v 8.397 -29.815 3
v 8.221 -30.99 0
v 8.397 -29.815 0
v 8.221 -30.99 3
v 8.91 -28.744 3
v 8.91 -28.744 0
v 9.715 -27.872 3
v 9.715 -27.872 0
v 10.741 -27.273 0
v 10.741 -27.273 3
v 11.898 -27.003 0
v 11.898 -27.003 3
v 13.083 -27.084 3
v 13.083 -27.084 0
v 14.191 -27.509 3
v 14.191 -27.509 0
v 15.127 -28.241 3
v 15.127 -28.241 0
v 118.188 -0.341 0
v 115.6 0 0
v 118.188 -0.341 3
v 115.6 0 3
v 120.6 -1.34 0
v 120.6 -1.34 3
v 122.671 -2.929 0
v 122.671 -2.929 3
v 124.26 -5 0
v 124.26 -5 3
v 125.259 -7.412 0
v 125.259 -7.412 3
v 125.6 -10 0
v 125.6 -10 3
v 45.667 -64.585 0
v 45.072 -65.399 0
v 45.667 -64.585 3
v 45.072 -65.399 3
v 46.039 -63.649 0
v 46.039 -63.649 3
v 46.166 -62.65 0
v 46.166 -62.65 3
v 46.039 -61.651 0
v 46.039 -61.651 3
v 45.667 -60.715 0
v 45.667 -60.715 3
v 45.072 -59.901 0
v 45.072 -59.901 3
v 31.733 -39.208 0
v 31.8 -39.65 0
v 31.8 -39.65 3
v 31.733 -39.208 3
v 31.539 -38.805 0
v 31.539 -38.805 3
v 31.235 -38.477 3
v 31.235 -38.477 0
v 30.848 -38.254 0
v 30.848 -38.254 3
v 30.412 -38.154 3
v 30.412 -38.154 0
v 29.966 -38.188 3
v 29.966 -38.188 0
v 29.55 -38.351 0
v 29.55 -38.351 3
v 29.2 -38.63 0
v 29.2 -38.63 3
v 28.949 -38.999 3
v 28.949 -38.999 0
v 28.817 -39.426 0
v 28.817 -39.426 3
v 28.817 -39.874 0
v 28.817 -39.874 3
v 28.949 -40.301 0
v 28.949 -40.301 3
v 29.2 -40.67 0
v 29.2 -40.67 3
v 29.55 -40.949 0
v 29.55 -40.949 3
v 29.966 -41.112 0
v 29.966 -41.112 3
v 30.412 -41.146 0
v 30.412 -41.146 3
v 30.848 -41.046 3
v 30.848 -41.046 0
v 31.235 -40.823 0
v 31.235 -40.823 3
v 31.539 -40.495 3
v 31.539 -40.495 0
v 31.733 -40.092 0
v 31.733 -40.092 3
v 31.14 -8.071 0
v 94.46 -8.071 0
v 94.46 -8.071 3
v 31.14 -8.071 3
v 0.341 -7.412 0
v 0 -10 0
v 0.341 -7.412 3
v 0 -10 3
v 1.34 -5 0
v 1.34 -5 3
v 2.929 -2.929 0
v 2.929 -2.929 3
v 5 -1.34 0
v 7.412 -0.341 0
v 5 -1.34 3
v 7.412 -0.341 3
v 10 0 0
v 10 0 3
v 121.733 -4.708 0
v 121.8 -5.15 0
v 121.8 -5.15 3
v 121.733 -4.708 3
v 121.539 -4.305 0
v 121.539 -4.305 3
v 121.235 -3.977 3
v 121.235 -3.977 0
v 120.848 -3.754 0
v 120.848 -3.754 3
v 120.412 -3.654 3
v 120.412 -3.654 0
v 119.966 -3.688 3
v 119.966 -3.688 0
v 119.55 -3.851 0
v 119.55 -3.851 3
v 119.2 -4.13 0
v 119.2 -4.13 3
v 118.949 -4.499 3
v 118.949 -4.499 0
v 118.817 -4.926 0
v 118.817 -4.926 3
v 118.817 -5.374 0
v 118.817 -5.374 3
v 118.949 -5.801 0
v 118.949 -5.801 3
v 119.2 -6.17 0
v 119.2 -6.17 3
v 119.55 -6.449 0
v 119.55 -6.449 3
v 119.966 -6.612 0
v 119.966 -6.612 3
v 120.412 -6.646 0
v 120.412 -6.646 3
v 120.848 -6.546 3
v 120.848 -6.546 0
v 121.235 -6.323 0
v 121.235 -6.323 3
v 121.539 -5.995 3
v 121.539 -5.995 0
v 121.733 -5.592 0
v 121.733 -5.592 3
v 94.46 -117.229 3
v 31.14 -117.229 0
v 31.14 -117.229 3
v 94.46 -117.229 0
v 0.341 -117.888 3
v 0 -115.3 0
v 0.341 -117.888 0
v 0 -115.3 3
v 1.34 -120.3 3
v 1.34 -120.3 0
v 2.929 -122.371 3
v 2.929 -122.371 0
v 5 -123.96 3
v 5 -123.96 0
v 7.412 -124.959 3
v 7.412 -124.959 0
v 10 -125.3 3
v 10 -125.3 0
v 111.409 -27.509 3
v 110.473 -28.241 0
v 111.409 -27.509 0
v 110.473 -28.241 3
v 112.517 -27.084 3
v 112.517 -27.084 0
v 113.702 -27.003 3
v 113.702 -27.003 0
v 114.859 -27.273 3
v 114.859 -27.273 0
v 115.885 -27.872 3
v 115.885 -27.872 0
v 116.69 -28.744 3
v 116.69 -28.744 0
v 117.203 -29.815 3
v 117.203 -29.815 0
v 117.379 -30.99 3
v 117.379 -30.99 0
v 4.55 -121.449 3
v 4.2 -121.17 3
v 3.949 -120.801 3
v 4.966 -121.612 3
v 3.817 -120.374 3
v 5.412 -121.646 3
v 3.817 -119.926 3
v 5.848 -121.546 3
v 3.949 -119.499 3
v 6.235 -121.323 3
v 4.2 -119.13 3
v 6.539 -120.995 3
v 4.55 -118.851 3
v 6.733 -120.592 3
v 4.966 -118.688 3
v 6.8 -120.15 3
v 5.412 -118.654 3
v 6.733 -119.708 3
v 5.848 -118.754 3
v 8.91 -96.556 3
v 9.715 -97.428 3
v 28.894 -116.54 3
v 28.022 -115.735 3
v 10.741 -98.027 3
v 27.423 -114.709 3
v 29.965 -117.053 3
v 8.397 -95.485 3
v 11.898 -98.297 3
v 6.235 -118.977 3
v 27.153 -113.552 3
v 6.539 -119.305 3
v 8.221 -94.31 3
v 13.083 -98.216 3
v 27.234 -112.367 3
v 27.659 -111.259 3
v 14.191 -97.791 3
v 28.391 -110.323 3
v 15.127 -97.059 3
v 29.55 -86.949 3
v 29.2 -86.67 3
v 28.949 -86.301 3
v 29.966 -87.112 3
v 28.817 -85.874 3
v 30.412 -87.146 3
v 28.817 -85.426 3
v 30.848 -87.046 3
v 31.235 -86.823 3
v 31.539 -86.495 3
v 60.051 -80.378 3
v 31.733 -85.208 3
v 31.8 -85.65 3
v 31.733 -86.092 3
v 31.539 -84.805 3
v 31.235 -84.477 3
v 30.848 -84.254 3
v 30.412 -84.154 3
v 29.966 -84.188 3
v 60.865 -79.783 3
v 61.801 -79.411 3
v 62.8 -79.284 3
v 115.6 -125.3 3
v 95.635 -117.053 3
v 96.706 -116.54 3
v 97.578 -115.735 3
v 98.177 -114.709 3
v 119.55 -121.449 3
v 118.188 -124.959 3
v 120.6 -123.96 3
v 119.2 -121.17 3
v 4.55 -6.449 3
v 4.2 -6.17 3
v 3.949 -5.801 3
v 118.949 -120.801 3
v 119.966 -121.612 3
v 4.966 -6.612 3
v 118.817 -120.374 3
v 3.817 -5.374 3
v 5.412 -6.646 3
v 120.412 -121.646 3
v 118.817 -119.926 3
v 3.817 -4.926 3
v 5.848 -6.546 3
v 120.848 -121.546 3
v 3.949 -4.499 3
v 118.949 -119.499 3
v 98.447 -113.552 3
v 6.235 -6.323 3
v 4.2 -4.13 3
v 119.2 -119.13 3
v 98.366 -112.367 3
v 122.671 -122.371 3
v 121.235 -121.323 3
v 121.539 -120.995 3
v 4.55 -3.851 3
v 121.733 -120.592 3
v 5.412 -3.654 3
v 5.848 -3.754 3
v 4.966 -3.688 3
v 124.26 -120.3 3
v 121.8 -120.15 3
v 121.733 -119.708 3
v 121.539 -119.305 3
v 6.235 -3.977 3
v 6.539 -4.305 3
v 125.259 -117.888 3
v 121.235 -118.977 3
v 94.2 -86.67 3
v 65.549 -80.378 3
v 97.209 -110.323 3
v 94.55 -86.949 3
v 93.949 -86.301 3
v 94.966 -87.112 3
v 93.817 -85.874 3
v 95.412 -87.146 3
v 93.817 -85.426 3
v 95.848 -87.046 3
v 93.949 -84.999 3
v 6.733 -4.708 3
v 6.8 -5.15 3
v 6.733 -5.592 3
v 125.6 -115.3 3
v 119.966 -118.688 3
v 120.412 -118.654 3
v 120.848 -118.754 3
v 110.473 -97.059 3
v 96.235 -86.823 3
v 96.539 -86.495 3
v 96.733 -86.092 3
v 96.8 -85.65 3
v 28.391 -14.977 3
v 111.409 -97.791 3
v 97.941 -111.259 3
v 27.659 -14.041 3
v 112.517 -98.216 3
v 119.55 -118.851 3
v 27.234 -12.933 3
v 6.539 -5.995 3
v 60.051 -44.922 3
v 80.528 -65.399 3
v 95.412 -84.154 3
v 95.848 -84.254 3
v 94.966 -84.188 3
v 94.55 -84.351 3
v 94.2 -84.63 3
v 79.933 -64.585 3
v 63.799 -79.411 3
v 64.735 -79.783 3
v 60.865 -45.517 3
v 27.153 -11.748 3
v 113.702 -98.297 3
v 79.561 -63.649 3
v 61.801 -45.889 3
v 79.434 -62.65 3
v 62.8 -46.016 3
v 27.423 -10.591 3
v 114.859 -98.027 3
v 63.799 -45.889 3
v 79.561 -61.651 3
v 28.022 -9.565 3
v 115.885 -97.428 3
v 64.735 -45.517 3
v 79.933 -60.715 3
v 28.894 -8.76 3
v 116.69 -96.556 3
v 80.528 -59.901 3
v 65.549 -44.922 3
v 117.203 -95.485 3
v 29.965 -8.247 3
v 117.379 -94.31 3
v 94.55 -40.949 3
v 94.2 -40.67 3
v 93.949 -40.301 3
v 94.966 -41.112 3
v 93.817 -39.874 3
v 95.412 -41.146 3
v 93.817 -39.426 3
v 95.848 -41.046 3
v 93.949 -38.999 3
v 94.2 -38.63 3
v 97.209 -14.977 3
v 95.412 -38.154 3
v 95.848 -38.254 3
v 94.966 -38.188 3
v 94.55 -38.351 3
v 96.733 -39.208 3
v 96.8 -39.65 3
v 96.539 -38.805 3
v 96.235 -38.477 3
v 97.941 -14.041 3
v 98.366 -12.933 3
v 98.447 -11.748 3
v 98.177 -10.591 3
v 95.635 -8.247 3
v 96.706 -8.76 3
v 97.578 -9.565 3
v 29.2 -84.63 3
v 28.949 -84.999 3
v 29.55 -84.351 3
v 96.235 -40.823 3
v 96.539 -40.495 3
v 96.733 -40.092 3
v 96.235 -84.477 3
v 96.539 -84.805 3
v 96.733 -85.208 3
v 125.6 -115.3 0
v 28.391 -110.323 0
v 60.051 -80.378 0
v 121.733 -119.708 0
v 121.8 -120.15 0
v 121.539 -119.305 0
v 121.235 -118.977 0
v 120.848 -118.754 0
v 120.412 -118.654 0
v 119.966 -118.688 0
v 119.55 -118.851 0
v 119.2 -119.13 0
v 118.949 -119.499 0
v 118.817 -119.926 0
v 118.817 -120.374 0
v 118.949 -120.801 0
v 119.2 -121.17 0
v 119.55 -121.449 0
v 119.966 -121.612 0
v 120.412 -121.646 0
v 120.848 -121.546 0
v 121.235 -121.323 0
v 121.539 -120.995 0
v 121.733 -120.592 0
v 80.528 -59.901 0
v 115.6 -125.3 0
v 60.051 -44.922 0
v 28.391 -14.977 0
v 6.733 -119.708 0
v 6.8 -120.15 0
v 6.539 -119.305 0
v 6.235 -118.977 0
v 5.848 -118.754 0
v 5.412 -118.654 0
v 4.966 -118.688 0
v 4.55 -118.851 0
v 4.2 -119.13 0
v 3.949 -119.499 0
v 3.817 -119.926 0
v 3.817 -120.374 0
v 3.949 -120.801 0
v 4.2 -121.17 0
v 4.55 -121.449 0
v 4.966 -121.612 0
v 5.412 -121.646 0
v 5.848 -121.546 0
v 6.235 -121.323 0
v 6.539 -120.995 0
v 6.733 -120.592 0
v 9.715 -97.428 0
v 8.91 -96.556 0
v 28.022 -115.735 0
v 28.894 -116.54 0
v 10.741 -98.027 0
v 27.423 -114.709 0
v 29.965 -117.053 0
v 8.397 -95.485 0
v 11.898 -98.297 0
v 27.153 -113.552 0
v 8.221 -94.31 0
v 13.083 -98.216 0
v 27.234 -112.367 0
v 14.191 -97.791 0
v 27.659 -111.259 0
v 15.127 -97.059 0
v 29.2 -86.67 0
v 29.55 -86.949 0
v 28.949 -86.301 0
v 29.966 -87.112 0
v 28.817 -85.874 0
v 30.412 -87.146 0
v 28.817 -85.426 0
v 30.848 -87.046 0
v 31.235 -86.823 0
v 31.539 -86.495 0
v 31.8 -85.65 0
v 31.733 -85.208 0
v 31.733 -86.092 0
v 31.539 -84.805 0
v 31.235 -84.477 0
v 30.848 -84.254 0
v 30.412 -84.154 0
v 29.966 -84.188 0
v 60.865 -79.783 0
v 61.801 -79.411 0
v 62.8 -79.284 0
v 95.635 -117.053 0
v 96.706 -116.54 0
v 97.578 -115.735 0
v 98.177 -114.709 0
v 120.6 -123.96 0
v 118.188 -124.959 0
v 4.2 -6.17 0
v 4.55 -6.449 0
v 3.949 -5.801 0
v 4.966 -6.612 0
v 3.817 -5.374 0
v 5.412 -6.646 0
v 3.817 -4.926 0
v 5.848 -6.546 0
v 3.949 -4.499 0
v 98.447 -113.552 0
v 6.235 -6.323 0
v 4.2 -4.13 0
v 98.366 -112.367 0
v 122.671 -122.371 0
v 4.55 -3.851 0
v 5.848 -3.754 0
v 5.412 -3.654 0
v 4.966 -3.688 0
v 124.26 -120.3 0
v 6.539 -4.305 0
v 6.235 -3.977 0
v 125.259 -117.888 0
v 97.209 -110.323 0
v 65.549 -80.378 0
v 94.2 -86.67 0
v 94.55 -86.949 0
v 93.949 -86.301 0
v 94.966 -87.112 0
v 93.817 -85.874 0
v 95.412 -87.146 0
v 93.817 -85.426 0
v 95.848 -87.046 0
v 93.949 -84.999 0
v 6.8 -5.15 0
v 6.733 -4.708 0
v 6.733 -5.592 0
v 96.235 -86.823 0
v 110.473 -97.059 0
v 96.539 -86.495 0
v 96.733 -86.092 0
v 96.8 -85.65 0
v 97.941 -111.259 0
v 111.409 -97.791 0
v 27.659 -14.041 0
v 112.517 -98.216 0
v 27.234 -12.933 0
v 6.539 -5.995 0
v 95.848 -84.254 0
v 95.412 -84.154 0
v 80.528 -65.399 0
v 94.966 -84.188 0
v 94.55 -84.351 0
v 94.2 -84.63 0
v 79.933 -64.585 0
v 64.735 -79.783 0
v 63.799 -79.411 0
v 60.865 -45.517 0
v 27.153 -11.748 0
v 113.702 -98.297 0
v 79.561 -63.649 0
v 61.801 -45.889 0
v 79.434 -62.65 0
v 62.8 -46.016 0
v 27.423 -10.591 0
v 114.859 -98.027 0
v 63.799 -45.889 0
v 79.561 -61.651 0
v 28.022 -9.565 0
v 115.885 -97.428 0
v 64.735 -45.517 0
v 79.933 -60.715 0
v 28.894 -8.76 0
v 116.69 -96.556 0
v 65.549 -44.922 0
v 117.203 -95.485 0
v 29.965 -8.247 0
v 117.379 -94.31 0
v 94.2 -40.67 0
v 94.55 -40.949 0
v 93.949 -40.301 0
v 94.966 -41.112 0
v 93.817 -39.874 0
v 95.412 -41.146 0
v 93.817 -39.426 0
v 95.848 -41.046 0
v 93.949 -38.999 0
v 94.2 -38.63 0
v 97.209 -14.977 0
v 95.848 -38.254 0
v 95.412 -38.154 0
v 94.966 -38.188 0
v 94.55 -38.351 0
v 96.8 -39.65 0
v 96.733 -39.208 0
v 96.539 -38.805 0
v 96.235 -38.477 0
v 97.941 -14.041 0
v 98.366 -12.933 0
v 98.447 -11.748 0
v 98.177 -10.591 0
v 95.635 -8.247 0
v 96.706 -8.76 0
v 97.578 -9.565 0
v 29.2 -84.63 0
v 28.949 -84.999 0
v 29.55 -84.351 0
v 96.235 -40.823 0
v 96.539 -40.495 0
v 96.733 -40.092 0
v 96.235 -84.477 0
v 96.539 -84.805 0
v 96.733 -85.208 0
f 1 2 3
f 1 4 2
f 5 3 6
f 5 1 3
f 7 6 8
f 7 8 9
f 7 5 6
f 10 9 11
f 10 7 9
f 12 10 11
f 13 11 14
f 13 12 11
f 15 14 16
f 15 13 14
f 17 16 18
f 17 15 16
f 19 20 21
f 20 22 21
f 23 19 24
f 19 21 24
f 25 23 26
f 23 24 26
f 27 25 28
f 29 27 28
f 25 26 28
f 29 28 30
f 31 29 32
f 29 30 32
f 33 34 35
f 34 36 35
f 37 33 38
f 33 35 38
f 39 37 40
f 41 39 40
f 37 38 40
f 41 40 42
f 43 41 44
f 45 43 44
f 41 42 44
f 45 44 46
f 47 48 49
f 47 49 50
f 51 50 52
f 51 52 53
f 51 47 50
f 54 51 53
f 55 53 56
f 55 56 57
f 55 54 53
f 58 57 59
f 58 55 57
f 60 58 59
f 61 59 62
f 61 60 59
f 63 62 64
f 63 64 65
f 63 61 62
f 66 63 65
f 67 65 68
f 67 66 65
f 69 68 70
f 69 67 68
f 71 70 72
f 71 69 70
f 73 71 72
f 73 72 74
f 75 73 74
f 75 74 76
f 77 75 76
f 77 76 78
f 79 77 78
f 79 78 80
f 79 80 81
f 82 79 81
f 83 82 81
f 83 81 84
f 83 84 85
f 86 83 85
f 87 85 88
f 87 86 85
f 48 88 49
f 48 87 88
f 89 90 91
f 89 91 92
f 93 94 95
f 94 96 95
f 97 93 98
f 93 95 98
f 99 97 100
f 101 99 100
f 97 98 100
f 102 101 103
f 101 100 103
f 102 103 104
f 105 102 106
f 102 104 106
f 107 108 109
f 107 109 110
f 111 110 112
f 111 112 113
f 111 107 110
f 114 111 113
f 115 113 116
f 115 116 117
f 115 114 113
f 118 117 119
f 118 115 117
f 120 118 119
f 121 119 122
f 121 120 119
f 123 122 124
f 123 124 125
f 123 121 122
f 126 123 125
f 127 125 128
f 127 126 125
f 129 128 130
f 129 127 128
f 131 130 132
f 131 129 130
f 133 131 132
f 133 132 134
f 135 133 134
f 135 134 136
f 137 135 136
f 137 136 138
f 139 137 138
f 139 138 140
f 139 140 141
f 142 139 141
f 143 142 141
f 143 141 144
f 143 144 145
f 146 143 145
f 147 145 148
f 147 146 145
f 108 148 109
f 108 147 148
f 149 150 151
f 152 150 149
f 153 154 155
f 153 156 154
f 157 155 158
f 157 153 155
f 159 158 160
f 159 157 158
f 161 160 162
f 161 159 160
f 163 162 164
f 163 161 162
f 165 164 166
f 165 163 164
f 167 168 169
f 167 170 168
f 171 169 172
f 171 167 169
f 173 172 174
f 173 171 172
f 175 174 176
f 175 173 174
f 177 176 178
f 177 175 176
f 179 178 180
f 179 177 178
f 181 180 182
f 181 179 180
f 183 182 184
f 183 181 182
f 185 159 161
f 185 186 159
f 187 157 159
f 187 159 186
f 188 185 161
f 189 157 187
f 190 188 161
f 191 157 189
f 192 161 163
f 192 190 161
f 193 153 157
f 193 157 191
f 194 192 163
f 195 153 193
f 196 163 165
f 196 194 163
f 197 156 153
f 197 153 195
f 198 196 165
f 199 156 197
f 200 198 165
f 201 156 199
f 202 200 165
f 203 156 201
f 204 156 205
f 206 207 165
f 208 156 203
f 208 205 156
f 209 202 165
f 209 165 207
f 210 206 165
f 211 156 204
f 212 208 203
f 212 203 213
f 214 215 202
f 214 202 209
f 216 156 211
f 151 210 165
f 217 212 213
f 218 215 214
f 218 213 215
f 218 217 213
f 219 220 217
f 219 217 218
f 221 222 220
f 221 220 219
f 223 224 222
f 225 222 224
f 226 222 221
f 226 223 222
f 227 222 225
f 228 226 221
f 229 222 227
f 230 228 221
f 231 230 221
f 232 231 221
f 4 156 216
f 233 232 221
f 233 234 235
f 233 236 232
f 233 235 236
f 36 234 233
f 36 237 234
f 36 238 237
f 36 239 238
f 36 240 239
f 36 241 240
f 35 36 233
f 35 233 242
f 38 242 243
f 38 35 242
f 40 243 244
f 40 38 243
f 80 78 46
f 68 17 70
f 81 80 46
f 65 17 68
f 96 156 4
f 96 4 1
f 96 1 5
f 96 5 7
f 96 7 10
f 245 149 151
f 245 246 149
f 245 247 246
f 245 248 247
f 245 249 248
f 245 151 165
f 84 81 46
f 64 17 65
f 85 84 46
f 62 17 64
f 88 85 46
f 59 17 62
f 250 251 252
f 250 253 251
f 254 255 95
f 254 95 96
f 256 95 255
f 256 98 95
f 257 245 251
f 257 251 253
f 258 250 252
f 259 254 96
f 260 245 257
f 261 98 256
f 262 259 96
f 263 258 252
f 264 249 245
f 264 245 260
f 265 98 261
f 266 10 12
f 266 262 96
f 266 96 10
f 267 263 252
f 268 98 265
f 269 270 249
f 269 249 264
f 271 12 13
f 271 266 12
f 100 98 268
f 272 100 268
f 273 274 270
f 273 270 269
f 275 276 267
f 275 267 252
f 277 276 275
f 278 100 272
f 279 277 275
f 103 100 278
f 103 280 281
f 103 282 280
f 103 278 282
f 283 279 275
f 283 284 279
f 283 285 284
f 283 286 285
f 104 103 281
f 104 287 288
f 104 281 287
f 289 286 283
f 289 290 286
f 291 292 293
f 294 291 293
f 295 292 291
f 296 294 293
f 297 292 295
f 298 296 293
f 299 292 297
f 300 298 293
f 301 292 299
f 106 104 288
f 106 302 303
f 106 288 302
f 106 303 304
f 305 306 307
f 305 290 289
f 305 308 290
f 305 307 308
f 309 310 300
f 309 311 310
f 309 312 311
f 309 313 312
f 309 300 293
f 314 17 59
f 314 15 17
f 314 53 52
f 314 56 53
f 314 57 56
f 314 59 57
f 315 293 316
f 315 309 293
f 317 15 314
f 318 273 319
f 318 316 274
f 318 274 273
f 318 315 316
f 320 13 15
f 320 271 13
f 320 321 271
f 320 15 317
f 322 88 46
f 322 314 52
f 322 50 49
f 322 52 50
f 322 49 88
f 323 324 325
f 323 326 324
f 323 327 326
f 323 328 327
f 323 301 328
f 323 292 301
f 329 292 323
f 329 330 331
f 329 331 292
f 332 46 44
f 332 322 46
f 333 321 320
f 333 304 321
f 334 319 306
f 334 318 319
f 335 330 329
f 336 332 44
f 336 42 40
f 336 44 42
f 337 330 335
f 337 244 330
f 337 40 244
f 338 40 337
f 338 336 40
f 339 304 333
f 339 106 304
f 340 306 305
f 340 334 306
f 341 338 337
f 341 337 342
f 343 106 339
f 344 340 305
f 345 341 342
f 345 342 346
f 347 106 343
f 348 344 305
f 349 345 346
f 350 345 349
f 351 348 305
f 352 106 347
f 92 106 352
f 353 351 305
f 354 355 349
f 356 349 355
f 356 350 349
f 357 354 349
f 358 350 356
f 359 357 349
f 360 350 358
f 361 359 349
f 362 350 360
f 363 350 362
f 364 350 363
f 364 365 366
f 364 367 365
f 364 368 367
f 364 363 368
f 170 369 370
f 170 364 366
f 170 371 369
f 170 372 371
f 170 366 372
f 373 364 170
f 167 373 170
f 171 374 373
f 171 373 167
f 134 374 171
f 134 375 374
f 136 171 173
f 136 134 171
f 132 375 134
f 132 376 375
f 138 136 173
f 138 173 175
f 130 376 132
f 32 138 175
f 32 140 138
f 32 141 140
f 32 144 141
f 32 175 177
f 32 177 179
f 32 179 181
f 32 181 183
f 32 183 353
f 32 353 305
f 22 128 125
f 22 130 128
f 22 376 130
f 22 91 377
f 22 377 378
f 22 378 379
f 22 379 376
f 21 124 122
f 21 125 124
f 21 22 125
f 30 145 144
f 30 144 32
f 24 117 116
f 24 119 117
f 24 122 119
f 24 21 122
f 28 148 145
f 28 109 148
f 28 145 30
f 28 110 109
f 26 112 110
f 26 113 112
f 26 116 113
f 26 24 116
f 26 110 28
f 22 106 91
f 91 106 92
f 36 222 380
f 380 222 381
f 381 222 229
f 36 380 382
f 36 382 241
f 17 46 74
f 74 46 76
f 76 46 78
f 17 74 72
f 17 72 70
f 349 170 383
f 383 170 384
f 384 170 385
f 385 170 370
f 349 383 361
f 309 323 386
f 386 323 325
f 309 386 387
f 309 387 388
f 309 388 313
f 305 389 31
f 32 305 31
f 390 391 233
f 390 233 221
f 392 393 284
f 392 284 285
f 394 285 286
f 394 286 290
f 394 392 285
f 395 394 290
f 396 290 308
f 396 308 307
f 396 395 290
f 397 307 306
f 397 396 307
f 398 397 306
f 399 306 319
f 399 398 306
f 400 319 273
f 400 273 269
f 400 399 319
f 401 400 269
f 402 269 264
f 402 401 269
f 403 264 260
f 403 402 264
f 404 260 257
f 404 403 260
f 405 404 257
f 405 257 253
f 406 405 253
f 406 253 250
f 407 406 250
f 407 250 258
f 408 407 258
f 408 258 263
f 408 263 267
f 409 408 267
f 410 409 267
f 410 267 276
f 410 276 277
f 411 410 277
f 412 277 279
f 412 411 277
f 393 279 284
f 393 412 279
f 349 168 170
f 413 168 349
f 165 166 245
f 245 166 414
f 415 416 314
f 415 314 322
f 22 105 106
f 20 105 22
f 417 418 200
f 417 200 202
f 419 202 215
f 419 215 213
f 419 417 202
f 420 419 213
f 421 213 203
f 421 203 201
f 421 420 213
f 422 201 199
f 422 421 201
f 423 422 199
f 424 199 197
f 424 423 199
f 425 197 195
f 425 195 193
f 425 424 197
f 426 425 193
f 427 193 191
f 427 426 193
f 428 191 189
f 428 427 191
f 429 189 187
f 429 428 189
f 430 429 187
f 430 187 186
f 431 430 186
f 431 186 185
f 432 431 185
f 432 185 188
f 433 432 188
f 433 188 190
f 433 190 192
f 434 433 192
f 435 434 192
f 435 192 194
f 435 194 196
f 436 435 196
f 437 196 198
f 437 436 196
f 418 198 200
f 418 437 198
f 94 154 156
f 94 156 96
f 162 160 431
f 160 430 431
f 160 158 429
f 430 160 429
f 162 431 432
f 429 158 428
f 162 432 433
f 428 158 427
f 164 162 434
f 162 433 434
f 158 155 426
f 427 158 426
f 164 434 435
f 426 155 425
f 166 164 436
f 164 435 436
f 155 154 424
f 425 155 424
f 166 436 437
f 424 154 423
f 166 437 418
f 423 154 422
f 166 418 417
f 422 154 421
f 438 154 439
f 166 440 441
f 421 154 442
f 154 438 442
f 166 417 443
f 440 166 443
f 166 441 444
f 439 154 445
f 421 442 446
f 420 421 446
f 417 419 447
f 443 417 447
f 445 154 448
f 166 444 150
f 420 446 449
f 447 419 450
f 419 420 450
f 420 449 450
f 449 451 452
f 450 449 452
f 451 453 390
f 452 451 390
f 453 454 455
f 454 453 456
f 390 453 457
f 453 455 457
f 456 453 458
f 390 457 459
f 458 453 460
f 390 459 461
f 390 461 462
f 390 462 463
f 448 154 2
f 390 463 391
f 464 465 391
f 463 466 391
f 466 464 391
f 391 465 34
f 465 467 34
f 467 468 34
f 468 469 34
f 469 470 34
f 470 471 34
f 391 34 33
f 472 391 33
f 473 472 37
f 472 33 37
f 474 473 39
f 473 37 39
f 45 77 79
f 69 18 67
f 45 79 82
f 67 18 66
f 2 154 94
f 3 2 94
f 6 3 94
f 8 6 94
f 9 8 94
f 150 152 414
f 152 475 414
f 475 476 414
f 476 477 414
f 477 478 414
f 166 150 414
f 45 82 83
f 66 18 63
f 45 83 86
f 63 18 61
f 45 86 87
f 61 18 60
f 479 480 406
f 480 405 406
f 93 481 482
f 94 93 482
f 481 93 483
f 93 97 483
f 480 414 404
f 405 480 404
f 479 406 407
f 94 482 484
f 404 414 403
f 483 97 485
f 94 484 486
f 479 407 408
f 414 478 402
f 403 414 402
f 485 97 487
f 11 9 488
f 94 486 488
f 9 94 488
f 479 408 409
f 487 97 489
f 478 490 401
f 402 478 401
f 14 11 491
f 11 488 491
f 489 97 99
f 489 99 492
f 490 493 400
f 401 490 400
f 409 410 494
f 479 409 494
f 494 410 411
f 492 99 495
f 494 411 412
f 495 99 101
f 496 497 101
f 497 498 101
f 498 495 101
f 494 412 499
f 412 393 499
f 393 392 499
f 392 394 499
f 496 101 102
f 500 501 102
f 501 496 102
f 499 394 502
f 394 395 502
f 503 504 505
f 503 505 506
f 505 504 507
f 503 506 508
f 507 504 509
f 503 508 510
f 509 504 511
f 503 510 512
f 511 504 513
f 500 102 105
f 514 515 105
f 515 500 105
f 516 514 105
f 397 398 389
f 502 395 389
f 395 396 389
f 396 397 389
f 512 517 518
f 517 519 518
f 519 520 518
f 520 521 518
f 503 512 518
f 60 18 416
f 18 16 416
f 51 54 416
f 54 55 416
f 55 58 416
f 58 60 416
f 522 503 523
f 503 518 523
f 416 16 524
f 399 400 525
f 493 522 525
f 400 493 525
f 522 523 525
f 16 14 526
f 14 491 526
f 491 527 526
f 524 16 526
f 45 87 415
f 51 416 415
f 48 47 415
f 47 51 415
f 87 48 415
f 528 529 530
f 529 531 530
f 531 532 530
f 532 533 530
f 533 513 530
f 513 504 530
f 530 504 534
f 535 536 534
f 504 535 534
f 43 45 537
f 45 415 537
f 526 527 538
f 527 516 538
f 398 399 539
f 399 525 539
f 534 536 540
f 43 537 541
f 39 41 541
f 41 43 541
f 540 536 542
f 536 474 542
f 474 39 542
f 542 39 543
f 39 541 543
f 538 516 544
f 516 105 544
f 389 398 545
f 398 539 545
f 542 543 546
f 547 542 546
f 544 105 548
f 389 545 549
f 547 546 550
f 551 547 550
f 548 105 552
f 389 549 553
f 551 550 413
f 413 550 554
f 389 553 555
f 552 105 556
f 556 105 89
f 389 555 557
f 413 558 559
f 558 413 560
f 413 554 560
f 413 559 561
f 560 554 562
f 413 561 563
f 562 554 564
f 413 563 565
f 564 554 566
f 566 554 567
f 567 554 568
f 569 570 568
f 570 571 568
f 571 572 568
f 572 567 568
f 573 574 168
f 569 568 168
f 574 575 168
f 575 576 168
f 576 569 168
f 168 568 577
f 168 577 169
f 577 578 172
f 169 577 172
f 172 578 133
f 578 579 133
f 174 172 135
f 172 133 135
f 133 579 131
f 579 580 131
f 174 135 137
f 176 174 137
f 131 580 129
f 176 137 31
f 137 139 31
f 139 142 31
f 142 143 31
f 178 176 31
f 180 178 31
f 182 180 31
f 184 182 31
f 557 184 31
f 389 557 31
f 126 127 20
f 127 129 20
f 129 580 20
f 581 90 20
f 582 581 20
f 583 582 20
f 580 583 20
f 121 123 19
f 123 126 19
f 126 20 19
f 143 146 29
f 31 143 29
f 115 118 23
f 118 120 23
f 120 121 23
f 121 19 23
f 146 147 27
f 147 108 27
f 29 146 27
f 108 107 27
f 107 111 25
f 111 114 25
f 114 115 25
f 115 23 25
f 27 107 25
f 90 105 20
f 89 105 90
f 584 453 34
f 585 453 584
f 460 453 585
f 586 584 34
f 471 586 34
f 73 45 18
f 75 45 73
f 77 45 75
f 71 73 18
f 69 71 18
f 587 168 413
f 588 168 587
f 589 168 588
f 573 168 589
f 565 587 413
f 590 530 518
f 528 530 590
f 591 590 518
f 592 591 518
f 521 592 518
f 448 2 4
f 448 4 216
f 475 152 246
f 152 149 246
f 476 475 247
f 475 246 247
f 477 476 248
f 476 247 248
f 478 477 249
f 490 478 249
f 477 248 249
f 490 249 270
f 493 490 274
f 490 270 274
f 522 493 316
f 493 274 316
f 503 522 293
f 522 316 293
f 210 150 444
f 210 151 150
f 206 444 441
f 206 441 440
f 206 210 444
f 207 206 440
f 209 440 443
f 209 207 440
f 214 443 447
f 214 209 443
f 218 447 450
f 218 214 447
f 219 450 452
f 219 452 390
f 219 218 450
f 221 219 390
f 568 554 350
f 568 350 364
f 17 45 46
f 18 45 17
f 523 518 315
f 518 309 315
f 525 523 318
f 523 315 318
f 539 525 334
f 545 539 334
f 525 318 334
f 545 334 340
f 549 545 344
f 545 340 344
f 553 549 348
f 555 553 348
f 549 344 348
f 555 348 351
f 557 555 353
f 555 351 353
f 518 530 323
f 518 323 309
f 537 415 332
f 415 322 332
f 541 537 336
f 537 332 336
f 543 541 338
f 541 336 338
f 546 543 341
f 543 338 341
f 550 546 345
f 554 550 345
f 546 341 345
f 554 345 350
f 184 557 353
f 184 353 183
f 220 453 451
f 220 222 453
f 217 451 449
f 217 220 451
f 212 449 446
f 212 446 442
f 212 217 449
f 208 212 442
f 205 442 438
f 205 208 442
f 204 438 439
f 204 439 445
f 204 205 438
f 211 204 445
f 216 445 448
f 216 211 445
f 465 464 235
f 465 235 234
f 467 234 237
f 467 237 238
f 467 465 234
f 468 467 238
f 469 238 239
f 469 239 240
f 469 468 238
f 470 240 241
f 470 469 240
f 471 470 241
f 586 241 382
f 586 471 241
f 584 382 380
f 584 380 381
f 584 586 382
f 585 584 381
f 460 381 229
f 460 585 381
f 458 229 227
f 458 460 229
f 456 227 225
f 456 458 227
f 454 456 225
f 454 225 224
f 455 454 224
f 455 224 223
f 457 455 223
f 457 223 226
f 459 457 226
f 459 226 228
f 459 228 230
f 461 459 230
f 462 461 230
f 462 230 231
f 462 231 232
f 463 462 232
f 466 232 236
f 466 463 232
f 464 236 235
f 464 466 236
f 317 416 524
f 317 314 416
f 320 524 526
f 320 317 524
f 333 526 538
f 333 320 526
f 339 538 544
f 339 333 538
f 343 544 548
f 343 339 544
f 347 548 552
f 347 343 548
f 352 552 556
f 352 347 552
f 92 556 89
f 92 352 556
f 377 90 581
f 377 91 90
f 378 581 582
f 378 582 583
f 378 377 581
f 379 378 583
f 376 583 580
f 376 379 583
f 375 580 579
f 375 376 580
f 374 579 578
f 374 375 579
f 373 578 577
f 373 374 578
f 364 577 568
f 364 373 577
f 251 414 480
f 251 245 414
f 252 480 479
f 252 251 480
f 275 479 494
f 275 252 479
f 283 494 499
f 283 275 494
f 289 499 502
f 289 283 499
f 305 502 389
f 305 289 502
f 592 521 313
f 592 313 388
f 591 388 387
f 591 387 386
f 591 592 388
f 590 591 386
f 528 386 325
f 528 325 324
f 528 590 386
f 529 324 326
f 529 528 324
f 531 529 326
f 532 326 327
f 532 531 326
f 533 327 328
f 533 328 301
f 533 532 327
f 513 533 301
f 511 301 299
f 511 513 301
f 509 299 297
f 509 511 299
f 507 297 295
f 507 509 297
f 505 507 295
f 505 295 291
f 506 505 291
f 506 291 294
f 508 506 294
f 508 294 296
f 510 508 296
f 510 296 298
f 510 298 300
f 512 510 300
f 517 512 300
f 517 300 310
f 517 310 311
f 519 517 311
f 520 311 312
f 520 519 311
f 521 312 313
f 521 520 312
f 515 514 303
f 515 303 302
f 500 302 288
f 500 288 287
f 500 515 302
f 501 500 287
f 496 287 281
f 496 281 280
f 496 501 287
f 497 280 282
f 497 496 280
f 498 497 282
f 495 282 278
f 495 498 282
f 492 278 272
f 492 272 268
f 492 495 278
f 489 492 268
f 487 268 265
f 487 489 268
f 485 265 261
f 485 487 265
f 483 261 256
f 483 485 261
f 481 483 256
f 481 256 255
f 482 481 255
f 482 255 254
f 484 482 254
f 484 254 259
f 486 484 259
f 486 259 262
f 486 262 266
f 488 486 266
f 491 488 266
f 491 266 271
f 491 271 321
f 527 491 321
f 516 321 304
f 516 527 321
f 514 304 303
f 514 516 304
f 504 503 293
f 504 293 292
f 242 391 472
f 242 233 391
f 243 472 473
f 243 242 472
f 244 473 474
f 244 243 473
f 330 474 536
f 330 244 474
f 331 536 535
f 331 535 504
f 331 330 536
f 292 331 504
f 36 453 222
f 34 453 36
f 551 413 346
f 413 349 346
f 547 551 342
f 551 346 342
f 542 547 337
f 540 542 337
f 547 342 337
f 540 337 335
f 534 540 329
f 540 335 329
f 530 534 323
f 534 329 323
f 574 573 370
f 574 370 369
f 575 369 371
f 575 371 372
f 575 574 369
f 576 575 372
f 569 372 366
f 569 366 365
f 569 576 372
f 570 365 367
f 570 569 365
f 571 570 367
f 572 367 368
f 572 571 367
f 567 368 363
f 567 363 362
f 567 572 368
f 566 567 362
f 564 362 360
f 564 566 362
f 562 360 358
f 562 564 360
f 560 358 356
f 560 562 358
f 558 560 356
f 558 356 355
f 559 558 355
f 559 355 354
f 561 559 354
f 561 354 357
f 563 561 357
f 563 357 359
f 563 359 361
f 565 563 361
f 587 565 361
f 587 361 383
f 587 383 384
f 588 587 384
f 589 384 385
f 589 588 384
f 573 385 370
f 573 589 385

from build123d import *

# Parameters (mm, degrees)
SKETCH_1_W      = 125.6
SKETCH_1_H      = 125.3
SKETCH_1_R      = 1.5
EXTRUDE_1_DEPTH = 3
FILLET_1_R      = 10
FILLET_2_R      = 4


with BuildPart() as part:
    # 草图1 → 凸台-拉伸1 (new body)
    with BuildSketch(Plane.XY):
        with Locations((62.8, -62.65)):
            Rectangle(SKETCH_1_W, SKETCH_1_H)
        with Locations((30.3, -39.65)):
            Circle(SKETCH_1_R, mode=Mode.SUBTRACT)
        with Locations((95.3, -39.65)):
            Circle(SKETCH_1_R, mode=Mode.SUBTRACT)
        with Locations((95.3, -85.65)):
            Circle(SKETCH_1_R, mode=Mode.SUBTRACT)
        with Locations((30.3, -85.65)):
            Circle(SKETCH_1_R, mode=Mode.SUBTRACT)
        with Locations((120.3, -120.15)):
            Circle(SKETCH_1_R, mode=Mode.SUBTRACT)
        with Locations((5.3, -120.15)):
            Circle(SKETCH_1_R, mode=Mode.SUBTRACT)
        with Locations((5.3, -5.15)):
            Circle(SKETCH_1_R, mode=Mode.SUBTRACT)
        with Locations((120.3, -5.15)):
            Circle(SKETCH_1_R, mode=Mode.SUBTRACT)
        Polygon((21.089760081, -117.229442096), (104.510239919, -117.229442096), (62.8, -77.778125501), align=None, mode=Mode.SUBTRACT)
        Polygon((8.220557904, -104.360239919), (47.671874499, -62.65), (8.220557904, -20.939760081), align=None, mode=Mode.SUBTRACT)
        Polygon((21.089760081, -8.070557904), (62.8, -47.521874499), (104.510239919, -8.070557904), align=None, mode=Mode.SUBTRACT)
        Polygon((117.379442096, -20.939760081), (77.928125501, -62.65), (117.379442096, -104.360239919), align=None, mode=Mode.SUBTRACT)
    extrude(amount=EXTRUDE_1_DEPTH)

    # 圆角1
    fillet_1_edges = [part.edges().sort_by_distance(p)[0] for p in [
        (0, 0, 1.5),
        (125.6, 0, 1.5),
        (125.6, -125.3, 1.5),
        (0, -125.3, 1.5),
    ]]
    fillet(fillet_1_edges, radius=FILLET_1_R)

    # 圆角2
    fillet_2_edges = [part.edges().sort_by_distance(p)[0] for p in [
        (62.8, -77.778125501, 1.5),
        (21.089760081, -117.229442096, 1.5),
        (104.510239919, -117.229442096, 1.5),
        (47.671874499, -62.65, 1.5),
        (8.220557904, -20.939760081, 1.5),
        (8.220557904, -104.360239919, 1.5),
        (62.8, -47.521874499, 1.5),
        (104.510239919, -8.070557904, 1.5),
        (21.089760081, -8.070557904, 1.5),
        (77.928125501, -62.65, 1.5),
        (117.379442096, -104.360239919, 1.5),
        (117.379442096, -20.939760081, 1.5),
    ]]
    fillet(fillet_2_edges, radius=FILLET_2_R)


solid = part.part
